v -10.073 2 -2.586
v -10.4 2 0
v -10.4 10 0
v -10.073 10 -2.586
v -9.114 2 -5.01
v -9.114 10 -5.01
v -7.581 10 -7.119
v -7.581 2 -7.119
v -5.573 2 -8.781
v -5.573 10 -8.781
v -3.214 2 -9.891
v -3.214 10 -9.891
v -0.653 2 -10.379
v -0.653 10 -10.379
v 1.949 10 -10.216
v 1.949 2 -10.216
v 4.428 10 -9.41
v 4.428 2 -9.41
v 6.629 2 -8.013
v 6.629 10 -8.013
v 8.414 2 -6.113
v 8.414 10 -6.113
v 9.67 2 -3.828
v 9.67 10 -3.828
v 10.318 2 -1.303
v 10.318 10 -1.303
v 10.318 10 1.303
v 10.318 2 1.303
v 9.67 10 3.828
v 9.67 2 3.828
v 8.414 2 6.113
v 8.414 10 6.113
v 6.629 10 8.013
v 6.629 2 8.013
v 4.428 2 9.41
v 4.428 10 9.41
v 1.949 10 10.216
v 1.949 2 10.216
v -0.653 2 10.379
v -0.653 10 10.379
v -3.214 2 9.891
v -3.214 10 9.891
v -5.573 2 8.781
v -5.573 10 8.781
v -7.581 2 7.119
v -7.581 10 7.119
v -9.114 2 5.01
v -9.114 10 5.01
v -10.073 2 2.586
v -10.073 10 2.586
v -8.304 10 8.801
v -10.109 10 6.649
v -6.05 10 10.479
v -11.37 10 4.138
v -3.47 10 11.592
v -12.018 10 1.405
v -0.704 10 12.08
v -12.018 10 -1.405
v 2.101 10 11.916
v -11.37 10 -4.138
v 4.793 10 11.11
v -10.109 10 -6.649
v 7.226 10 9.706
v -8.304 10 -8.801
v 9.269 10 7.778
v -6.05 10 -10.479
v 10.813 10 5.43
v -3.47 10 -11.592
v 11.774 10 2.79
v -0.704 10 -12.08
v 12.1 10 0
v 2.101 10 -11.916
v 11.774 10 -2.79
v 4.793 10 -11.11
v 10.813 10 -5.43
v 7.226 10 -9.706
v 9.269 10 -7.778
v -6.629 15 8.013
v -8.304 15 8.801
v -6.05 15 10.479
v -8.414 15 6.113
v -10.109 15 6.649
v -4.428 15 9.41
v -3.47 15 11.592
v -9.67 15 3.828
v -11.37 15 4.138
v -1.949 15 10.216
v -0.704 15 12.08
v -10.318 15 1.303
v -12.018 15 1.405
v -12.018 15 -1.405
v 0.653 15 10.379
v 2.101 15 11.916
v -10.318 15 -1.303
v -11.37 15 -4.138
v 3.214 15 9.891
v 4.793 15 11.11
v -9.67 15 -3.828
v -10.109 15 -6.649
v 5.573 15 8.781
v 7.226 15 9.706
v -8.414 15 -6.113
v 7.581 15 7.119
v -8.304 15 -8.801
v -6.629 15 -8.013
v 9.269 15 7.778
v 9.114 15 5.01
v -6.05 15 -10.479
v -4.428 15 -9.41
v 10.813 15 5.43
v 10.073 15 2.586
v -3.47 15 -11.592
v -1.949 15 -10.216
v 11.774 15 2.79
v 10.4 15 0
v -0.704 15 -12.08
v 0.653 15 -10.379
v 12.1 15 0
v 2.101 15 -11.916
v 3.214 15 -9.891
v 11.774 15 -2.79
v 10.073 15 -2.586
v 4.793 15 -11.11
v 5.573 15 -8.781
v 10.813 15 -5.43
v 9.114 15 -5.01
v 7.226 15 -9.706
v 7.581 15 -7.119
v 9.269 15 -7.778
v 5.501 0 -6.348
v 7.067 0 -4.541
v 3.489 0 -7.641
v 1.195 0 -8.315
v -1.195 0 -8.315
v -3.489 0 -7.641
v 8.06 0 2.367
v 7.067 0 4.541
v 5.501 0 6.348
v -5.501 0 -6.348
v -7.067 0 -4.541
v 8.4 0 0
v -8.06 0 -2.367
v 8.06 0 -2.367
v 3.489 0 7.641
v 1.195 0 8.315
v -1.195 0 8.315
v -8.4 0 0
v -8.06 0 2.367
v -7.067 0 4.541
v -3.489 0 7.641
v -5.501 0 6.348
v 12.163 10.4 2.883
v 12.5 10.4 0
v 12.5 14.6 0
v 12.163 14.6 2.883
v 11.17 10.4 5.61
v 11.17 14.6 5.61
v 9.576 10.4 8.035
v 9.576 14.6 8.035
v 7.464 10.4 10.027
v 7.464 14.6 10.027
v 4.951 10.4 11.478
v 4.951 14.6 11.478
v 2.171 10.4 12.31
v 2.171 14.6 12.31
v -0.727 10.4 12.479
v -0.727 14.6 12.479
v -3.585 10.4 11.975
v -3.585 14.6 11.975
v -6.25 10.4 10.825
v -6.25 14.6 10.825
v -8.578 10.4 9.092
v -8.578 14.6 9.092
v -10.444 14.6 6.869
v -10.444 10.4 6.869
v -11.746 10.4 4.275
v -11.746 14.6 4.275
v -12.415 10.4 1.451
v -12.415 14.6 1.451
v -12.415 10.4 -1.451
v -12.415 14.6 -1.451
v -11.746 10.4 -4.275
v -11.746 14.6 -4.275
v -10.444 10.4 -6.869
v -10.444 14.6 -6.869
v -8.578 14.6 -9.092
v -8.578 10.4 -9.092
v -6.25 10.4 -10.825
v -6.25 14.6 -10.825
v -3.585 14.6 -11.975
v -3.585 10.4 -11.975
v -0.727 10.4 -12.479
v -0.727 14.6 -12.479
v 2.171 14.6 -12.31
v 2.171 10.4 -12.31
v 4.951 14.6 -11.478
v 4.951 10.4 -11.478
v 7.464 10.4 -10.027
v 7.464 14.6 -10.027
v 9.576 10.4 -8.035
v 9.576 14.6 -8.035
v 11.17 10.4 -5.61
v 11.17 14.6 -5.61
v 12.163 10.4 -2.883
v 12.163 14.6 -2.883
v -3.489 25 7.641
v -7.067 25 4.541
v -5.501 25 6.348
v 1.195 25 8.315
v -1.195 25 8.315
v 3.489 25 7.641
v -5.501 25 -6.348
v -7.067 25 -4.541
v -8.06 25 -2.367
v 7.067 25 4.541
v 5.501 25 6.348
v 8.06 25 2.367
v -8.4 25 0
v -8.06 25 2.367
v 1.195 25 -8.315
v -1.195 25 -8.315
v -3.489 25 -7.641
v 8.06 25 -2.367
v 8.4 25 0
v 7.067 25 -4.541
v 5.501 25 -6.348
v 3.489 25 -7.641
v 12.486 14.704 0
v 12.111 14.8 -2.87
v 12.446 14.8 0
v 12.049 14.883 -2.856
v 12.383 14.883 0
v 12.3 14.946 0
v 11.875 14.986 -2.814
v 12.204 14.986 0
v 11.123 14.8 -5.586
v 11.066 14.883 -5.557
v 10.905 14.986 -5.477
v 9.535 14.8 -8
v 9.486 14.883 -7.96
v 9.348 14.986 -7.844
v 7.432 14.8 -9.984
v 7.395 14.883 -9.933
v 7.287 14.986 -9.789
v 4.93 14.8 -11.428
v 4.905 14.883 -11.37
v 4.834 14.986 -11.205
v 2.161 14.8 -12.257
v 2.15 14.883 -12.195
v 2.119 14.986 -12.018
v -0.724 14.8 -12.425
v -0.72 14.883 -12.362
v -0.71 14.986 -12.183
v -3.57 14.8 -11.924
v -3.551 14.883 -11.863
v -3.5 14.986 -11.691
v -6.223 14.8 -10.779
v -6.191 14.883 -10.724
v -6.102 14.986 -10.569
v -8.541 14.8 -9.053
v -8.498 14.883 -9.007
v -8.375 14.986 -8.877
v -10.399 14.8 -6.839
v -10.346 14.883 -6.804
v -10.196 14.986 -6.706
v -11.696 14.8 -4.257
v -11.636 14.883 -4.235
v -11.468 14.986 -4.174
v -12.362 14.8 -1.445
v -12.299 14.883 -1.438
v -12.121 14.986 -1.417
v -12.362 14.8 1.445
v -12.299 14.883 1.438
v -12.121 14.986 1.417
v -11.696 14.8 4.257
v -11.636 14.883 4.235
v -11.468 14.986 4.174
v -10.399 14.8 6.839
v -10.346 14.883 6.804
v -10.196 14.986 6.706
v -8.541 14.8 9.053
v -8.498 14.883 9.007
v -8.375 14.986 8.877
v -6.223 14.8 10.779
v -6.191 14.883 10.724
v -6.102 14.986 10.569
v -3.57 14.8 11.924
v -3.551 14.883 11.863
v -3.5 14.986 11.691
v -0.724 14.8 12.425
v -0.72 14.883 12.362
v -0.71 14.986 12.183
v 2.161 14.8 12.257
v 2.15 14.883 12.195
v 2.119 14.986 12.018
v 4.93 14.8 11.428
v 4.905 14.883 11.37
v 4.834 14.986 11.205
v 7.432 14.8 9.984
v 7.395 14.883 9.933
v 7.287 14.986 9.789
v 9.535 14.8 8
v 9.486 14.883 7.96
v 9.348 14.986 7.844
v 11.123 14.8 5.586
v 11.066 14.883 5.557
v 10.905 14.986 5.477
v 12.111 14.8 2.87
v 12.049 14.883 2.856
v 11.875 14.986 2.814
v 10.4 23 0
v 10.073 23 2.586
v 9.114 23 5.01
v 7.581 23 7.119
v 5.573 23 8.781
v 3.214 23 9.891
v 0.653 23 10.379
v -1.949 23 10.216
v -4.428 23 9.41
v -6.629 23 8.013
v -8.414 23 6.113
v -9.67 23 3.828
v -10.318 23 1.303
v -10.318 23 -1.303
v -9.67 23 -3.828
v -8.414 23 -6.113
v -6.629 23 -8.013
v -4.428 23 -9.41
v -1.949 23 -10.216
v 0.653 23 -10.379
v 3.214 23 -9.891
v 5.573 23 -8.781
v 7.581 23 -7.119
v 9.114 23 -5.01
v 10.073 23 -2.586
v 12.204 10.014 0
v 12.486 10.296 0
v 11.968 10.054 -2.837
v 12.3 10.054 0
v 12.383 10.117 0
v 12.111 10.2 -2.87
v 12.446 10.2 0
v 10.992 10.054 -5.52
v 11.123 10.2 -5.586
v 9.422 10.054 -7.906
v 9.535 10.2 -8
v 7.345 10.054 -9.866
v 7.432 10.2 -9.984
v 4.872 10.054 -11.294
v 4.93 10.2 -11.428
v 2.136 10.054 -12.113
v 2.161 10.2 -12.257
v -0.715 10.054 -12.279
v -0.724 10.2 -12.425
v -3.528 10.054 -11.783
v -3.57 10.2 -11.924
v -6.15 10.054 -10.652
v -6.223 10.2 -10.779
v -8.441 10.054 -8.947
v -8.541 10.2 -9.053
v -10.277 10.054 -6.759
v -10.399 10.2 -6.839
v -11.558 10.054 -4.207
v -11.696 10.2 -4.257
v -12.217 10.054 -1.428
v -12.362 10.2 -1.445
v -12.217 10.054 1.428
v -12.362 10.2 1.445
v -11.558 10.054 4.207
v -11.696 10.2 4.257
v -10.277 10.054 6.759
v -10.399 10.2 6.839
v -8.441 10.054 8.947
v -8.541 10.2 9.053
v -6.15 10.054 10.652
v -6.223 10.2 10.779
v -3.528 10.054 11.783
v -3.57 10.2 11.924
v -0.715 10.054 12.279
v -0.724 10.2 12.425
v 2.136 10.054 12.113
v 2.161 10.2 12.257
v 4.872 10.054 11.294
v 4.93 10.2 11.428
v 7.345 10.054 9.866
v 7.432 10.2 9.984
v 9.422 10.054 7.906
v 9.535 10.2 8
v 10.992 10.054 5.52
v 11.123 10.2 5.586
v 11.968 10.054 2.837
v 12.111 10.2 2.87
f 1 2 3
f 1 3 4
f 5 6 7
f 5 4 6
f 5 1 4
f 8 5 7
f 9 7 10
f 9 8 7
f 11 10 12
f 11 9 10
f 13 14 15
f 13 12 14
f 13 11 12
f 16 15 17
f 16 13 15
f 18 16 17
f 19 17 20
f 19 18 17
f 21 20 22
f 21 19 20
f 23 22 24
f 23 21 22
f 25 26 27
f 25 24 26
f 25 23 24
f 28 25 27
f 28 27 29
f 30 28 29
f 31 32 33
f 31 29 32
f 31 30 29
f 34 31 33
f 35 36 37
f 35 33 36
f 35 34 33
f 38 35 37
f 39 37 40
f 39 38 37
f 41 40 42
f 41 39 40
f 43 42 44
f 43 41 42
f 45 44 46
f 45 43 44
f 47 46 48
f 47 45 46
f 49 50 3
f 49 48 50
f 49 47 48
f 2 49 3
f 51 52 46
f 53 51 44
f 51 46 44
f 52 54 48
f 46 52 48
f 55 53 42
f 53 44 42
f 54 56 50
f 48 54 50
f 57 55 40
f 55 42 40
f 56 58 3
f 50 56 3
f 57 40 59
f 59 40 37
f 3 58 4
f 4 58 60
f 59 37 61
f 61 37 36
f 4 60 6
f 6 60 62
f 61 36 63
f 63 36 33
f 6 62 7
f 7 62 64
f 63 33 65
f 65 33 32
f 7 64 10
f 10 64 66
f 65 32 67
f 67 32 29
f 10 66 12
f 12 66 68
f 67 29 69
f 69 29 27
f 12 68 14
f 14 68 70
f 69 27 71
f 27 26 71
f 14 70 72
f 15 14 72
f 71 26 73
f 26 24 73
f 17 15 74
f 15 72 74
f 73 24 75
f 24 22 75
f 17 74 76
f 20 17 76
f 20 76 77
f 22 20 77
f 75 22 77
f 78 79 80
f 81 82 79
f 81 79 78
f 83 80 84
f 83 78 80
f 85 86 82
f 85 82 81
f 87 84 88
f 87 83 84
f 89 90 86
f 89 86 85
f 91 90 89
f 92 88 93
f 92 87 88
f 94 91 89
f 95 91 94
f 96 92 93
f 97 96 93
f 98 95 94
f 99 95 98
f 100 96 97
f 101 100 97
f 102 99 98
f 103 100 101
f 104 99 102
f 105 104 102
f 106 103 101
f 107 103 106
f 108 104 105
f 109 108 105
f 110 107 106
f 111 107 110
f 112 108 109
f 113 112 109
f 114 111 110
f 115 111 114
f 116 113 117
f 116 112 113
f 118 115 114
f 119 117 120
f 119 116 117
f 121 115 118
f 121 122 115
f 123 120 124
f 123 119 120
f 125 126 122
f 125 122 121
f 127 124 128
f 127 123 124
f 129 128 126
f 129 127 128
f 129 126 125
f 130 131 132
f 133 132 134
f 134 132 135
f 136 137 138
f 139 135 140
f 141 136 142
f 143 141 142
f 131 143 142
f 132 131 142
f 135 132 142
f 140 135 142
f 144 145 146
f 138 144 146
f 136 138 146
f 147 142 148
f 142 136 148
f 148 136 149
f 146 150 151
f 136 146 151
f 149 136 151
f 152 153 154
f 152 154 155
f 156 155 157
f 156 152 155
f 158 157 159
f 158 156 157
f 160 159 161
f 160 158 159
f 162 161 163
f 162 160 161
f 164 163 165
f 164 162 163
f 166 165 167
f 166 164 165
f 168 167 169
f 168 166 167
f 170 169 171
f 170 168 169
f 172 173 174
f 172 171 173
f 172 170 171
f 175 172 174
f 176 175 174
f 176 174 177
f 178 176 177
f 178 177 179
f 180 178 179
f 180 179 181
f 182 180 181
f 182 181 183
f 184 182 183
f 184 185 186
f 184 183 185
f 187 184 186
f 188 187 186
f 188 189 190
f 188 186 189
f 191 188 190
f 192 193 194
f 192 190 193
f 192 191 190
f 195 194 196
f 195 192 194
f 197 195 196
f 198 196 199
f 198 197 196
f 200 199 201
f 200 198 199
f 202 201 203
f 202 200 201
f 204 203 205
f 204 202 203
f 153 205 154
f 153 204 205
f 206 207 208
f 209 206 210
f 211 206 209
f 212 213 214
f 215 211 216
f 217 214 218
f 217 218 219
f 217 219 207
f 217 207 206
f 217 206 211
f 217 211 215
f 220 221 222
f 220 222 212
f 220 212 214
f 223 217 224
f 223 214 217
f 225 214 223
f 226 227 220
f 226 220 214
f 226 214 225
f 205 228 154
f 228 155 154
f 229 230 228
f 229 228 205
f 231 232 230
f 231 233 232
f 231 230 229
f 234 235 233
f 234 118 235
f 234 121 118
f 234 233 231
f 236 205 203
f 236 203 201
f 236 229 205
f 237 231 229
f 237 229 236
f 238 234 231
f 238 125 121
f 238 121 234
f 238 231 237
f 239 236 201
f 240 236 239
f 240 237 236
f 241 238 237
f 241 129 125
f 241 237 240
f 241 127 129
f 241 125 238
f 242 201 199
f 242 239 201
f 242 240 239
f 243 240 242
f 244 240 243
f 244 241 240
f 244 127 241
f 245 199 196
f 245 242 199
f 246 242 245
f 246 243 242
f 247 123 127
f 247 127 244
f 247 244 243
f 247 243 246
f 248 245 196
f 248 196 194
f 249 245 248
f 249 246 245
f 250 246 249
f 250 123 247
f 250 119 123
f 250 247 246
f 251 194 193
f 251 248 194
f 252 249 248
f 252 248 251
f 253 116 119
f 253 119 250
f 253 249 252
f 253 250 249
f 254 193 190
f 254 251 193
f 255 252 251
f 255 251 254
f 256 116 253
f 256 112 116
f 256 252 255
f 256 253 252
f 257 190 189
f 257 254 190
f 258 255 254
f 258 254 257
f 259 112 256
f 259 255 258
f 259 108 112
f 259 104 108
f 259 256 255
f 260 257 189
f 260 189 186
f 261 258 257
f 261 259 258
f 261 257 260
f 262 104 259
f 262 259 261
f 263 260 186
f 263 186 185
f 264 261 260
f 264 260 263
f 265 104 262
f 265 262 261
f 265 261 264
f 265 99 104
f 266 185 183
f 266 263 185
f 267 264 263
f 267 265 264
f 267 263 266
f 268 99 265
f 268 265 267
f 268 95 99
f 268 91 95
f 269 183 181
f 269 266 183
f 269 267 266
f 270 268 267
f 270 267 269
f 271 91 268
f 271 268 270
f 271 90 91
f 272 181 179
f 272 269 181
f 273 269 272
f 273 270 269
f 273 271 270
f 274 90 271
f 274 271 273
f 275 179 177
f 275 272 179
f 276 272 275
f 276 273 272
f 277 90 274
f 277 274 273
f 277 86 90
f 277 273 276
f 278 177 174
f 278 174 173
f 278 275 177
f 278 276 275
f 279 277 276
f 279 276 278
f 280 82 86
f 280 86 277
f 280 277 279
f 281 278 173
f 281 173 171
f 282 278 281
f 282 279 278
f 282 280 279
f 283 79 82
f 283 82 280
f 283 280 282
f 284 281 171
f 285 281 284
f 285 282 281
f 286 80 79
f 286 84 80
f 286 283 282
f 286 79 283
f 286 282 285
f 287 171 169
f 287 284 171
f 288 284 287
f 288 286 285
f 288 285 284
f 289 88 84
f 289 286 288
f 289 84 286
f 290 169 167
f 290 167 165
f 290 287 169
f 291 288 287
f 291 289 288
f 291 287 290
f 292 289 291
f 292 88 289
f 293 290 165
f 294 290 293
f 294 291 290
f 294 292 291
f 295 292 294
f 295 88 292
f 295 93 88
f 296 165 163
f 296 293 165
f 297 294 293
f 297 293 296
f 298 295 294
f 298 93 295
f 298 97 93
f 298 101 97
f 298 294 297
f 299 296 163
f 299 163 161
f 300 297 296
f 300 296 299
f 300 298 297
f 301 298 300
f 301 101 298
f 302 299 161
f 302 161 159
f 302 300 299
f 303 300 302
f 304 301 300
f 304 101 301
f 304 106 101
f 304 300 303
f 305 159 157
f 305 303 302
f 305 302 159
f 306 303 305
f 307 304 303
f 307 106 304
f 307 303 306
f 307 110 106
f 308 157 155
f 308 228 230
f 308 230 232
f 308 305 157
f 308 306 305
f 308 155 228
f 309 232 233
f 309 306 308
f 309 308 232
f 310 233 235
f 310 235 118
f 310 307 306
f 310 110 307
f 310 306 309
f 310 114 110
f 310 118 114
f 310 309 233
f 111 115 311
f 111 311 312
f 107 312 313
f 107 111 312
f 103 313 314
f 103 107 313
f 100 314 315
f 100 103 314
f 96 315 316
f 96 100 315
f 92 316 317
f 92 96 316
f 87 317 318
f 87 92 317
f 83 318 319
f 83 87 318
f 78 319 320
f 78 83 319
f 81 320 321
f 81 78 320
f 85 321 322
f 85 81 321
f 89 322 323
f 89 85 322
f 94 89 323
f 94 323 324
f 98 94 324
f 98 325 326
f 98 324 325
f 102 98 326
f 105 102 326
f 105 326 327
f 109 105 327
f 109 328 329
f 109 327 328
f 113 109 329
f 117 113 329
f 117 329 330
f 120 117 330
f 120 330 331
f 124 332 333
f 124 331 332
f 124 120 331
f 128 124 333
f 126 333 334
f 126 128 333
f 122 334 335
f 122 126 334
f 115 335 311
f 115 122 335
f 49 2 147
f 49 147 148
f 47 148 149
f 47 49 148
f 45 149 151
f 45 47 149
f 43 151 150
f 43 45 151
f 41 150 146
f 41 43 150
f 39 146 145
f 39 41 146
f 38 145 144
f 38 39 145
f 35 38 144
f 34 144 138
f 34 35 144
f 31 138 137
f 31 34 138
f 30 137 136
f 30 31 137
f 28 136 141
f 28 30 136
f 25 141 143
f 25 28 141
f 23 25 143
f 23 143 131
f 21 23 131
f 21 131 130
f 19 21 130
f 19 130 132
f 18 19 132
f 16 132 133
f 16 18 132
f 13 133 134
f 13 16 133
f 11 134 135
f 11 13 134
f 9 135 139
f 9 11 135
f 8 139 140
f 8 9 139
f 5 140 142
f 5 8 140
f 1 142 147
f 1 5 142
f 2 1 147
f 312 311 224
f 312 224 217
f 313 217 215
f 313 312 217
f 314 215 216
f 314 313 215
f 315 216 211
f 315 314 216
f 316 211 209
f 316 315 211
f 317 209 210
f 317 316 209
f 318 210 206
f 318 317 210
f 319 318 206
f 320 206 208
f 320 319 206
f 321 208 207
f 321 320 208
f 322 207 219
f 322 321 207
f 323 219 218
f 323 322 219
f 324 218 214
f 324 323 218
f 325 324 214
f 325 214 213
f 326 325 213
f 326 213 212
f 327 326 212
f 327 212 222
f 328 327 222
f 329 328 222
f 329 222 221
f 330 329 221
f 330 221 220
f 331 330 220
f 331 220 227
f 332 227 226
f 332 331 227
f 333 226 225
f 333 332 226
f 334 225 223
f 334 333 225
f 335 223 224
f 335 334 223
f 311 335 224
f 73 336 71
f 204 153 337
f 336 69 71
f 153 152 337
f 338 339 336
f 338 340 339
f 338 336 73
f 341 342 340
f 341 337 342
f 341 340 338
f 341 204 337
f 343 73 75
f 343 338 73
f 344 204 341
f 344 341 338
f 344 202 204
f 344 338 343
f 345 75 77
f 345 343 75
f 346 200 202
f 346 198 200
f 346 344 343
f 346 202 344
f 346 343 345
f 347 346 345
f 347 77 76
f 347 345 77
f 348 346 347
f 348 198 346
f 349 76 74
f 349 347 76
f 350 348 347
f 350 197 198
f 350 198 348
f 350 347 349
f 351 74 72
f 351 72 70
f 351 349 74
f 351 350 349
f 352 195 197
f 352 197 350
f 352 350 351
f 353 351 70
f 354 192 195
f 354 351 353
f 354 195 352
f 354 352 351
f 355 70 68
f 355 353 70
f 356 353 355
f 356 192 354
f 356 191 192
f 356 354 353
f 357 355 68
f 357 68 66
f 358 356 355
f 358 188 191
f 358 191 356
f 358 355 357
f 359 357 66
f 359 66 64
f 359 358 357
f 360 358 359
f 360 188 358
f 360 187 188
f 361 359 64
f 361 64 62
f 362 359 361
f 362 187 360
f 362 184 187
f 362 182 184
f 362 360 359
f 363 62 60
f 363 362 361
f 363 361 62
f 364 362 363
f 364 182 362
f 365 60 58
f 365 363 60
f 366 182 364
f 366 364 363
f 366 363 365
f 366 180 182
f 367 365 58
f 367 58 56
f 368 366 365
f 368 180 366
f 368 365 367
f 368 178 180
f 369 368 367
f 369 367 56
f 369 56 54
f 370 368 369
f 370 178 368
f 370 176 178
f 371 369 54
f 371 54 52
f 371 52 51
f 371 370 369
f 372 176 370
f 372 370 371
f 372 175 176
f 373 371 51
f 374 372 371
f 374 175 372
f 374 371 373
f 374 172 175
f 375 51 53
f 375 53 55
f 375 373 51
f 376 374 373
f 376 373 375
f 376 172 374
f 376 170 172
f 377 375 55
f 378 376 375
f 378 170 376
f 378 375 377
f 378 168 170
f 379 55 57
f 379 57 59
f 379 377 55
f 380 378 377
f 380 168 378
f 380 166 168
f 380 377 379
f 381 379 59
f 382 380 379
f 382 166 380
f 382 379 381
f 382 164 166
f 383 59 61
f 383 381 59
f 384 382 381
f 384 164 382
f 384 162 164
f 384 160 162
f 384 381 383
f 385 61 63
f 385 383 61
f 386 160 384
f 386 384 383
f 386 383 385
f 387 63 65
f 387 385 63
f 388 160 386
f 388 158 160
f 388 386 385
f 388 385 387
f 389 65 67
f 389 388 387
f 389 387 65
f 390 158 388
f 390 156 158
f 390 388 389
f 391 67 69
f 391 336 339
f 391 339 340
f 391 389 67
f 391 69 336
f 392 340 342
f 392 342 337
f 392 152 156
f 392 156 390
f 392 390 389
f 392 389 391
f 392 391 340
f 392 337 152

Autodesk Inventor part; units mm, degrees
ref_plane "YZ Plane" through (0, 0, 0) normal (1, 0, 0) x (0, 1, 0)
ref_plane "XZ Plane" through (0, 0, 0) normal (0, 1, 0) x (-1, 0, 0)
ref_plane "XY Plane" through (0, 0, 0) normal (0, 0, 1) x (1, 0, 0)
sketch "草图1" plane through (0, 0, 0) normal (0, 1, 0) x (-1, 0, 0)
  circle A0 centre (0, 0) radius 10.4
  dimension "d1" = 20.8
extrude "拉伸1" add sketch "草图1" along normal blind 10
sketch "草图2" plane through (0, 10, 0) normal (0, 1, 0) x (1, 0, 0)
  circle A0 centre (0, 0) radius 12.5
  dimension "d4" = 25
extrude "拉伸2" add sketch "草图2" along normal blind 5
sketch "草图3" plane through (0, 15, 0) normal (0, 1, 0) x (1, 0, 0)
  circle A0 centre (0, 0) radius 10.4
  dimension "d7" = 20.8
extrude "拉伸3" add sketch "草图3" along normal blind 10
chamfer "倒角1" distance 2 angle 45 2 edges at (10.4, 0, 0) (-10.4, 25, 0)
fillet "圆角1" radius 0.4 2 edges at (-12.5, 10, 0) (-12.5, 15, 0)
properties part number "GuardStopper"
